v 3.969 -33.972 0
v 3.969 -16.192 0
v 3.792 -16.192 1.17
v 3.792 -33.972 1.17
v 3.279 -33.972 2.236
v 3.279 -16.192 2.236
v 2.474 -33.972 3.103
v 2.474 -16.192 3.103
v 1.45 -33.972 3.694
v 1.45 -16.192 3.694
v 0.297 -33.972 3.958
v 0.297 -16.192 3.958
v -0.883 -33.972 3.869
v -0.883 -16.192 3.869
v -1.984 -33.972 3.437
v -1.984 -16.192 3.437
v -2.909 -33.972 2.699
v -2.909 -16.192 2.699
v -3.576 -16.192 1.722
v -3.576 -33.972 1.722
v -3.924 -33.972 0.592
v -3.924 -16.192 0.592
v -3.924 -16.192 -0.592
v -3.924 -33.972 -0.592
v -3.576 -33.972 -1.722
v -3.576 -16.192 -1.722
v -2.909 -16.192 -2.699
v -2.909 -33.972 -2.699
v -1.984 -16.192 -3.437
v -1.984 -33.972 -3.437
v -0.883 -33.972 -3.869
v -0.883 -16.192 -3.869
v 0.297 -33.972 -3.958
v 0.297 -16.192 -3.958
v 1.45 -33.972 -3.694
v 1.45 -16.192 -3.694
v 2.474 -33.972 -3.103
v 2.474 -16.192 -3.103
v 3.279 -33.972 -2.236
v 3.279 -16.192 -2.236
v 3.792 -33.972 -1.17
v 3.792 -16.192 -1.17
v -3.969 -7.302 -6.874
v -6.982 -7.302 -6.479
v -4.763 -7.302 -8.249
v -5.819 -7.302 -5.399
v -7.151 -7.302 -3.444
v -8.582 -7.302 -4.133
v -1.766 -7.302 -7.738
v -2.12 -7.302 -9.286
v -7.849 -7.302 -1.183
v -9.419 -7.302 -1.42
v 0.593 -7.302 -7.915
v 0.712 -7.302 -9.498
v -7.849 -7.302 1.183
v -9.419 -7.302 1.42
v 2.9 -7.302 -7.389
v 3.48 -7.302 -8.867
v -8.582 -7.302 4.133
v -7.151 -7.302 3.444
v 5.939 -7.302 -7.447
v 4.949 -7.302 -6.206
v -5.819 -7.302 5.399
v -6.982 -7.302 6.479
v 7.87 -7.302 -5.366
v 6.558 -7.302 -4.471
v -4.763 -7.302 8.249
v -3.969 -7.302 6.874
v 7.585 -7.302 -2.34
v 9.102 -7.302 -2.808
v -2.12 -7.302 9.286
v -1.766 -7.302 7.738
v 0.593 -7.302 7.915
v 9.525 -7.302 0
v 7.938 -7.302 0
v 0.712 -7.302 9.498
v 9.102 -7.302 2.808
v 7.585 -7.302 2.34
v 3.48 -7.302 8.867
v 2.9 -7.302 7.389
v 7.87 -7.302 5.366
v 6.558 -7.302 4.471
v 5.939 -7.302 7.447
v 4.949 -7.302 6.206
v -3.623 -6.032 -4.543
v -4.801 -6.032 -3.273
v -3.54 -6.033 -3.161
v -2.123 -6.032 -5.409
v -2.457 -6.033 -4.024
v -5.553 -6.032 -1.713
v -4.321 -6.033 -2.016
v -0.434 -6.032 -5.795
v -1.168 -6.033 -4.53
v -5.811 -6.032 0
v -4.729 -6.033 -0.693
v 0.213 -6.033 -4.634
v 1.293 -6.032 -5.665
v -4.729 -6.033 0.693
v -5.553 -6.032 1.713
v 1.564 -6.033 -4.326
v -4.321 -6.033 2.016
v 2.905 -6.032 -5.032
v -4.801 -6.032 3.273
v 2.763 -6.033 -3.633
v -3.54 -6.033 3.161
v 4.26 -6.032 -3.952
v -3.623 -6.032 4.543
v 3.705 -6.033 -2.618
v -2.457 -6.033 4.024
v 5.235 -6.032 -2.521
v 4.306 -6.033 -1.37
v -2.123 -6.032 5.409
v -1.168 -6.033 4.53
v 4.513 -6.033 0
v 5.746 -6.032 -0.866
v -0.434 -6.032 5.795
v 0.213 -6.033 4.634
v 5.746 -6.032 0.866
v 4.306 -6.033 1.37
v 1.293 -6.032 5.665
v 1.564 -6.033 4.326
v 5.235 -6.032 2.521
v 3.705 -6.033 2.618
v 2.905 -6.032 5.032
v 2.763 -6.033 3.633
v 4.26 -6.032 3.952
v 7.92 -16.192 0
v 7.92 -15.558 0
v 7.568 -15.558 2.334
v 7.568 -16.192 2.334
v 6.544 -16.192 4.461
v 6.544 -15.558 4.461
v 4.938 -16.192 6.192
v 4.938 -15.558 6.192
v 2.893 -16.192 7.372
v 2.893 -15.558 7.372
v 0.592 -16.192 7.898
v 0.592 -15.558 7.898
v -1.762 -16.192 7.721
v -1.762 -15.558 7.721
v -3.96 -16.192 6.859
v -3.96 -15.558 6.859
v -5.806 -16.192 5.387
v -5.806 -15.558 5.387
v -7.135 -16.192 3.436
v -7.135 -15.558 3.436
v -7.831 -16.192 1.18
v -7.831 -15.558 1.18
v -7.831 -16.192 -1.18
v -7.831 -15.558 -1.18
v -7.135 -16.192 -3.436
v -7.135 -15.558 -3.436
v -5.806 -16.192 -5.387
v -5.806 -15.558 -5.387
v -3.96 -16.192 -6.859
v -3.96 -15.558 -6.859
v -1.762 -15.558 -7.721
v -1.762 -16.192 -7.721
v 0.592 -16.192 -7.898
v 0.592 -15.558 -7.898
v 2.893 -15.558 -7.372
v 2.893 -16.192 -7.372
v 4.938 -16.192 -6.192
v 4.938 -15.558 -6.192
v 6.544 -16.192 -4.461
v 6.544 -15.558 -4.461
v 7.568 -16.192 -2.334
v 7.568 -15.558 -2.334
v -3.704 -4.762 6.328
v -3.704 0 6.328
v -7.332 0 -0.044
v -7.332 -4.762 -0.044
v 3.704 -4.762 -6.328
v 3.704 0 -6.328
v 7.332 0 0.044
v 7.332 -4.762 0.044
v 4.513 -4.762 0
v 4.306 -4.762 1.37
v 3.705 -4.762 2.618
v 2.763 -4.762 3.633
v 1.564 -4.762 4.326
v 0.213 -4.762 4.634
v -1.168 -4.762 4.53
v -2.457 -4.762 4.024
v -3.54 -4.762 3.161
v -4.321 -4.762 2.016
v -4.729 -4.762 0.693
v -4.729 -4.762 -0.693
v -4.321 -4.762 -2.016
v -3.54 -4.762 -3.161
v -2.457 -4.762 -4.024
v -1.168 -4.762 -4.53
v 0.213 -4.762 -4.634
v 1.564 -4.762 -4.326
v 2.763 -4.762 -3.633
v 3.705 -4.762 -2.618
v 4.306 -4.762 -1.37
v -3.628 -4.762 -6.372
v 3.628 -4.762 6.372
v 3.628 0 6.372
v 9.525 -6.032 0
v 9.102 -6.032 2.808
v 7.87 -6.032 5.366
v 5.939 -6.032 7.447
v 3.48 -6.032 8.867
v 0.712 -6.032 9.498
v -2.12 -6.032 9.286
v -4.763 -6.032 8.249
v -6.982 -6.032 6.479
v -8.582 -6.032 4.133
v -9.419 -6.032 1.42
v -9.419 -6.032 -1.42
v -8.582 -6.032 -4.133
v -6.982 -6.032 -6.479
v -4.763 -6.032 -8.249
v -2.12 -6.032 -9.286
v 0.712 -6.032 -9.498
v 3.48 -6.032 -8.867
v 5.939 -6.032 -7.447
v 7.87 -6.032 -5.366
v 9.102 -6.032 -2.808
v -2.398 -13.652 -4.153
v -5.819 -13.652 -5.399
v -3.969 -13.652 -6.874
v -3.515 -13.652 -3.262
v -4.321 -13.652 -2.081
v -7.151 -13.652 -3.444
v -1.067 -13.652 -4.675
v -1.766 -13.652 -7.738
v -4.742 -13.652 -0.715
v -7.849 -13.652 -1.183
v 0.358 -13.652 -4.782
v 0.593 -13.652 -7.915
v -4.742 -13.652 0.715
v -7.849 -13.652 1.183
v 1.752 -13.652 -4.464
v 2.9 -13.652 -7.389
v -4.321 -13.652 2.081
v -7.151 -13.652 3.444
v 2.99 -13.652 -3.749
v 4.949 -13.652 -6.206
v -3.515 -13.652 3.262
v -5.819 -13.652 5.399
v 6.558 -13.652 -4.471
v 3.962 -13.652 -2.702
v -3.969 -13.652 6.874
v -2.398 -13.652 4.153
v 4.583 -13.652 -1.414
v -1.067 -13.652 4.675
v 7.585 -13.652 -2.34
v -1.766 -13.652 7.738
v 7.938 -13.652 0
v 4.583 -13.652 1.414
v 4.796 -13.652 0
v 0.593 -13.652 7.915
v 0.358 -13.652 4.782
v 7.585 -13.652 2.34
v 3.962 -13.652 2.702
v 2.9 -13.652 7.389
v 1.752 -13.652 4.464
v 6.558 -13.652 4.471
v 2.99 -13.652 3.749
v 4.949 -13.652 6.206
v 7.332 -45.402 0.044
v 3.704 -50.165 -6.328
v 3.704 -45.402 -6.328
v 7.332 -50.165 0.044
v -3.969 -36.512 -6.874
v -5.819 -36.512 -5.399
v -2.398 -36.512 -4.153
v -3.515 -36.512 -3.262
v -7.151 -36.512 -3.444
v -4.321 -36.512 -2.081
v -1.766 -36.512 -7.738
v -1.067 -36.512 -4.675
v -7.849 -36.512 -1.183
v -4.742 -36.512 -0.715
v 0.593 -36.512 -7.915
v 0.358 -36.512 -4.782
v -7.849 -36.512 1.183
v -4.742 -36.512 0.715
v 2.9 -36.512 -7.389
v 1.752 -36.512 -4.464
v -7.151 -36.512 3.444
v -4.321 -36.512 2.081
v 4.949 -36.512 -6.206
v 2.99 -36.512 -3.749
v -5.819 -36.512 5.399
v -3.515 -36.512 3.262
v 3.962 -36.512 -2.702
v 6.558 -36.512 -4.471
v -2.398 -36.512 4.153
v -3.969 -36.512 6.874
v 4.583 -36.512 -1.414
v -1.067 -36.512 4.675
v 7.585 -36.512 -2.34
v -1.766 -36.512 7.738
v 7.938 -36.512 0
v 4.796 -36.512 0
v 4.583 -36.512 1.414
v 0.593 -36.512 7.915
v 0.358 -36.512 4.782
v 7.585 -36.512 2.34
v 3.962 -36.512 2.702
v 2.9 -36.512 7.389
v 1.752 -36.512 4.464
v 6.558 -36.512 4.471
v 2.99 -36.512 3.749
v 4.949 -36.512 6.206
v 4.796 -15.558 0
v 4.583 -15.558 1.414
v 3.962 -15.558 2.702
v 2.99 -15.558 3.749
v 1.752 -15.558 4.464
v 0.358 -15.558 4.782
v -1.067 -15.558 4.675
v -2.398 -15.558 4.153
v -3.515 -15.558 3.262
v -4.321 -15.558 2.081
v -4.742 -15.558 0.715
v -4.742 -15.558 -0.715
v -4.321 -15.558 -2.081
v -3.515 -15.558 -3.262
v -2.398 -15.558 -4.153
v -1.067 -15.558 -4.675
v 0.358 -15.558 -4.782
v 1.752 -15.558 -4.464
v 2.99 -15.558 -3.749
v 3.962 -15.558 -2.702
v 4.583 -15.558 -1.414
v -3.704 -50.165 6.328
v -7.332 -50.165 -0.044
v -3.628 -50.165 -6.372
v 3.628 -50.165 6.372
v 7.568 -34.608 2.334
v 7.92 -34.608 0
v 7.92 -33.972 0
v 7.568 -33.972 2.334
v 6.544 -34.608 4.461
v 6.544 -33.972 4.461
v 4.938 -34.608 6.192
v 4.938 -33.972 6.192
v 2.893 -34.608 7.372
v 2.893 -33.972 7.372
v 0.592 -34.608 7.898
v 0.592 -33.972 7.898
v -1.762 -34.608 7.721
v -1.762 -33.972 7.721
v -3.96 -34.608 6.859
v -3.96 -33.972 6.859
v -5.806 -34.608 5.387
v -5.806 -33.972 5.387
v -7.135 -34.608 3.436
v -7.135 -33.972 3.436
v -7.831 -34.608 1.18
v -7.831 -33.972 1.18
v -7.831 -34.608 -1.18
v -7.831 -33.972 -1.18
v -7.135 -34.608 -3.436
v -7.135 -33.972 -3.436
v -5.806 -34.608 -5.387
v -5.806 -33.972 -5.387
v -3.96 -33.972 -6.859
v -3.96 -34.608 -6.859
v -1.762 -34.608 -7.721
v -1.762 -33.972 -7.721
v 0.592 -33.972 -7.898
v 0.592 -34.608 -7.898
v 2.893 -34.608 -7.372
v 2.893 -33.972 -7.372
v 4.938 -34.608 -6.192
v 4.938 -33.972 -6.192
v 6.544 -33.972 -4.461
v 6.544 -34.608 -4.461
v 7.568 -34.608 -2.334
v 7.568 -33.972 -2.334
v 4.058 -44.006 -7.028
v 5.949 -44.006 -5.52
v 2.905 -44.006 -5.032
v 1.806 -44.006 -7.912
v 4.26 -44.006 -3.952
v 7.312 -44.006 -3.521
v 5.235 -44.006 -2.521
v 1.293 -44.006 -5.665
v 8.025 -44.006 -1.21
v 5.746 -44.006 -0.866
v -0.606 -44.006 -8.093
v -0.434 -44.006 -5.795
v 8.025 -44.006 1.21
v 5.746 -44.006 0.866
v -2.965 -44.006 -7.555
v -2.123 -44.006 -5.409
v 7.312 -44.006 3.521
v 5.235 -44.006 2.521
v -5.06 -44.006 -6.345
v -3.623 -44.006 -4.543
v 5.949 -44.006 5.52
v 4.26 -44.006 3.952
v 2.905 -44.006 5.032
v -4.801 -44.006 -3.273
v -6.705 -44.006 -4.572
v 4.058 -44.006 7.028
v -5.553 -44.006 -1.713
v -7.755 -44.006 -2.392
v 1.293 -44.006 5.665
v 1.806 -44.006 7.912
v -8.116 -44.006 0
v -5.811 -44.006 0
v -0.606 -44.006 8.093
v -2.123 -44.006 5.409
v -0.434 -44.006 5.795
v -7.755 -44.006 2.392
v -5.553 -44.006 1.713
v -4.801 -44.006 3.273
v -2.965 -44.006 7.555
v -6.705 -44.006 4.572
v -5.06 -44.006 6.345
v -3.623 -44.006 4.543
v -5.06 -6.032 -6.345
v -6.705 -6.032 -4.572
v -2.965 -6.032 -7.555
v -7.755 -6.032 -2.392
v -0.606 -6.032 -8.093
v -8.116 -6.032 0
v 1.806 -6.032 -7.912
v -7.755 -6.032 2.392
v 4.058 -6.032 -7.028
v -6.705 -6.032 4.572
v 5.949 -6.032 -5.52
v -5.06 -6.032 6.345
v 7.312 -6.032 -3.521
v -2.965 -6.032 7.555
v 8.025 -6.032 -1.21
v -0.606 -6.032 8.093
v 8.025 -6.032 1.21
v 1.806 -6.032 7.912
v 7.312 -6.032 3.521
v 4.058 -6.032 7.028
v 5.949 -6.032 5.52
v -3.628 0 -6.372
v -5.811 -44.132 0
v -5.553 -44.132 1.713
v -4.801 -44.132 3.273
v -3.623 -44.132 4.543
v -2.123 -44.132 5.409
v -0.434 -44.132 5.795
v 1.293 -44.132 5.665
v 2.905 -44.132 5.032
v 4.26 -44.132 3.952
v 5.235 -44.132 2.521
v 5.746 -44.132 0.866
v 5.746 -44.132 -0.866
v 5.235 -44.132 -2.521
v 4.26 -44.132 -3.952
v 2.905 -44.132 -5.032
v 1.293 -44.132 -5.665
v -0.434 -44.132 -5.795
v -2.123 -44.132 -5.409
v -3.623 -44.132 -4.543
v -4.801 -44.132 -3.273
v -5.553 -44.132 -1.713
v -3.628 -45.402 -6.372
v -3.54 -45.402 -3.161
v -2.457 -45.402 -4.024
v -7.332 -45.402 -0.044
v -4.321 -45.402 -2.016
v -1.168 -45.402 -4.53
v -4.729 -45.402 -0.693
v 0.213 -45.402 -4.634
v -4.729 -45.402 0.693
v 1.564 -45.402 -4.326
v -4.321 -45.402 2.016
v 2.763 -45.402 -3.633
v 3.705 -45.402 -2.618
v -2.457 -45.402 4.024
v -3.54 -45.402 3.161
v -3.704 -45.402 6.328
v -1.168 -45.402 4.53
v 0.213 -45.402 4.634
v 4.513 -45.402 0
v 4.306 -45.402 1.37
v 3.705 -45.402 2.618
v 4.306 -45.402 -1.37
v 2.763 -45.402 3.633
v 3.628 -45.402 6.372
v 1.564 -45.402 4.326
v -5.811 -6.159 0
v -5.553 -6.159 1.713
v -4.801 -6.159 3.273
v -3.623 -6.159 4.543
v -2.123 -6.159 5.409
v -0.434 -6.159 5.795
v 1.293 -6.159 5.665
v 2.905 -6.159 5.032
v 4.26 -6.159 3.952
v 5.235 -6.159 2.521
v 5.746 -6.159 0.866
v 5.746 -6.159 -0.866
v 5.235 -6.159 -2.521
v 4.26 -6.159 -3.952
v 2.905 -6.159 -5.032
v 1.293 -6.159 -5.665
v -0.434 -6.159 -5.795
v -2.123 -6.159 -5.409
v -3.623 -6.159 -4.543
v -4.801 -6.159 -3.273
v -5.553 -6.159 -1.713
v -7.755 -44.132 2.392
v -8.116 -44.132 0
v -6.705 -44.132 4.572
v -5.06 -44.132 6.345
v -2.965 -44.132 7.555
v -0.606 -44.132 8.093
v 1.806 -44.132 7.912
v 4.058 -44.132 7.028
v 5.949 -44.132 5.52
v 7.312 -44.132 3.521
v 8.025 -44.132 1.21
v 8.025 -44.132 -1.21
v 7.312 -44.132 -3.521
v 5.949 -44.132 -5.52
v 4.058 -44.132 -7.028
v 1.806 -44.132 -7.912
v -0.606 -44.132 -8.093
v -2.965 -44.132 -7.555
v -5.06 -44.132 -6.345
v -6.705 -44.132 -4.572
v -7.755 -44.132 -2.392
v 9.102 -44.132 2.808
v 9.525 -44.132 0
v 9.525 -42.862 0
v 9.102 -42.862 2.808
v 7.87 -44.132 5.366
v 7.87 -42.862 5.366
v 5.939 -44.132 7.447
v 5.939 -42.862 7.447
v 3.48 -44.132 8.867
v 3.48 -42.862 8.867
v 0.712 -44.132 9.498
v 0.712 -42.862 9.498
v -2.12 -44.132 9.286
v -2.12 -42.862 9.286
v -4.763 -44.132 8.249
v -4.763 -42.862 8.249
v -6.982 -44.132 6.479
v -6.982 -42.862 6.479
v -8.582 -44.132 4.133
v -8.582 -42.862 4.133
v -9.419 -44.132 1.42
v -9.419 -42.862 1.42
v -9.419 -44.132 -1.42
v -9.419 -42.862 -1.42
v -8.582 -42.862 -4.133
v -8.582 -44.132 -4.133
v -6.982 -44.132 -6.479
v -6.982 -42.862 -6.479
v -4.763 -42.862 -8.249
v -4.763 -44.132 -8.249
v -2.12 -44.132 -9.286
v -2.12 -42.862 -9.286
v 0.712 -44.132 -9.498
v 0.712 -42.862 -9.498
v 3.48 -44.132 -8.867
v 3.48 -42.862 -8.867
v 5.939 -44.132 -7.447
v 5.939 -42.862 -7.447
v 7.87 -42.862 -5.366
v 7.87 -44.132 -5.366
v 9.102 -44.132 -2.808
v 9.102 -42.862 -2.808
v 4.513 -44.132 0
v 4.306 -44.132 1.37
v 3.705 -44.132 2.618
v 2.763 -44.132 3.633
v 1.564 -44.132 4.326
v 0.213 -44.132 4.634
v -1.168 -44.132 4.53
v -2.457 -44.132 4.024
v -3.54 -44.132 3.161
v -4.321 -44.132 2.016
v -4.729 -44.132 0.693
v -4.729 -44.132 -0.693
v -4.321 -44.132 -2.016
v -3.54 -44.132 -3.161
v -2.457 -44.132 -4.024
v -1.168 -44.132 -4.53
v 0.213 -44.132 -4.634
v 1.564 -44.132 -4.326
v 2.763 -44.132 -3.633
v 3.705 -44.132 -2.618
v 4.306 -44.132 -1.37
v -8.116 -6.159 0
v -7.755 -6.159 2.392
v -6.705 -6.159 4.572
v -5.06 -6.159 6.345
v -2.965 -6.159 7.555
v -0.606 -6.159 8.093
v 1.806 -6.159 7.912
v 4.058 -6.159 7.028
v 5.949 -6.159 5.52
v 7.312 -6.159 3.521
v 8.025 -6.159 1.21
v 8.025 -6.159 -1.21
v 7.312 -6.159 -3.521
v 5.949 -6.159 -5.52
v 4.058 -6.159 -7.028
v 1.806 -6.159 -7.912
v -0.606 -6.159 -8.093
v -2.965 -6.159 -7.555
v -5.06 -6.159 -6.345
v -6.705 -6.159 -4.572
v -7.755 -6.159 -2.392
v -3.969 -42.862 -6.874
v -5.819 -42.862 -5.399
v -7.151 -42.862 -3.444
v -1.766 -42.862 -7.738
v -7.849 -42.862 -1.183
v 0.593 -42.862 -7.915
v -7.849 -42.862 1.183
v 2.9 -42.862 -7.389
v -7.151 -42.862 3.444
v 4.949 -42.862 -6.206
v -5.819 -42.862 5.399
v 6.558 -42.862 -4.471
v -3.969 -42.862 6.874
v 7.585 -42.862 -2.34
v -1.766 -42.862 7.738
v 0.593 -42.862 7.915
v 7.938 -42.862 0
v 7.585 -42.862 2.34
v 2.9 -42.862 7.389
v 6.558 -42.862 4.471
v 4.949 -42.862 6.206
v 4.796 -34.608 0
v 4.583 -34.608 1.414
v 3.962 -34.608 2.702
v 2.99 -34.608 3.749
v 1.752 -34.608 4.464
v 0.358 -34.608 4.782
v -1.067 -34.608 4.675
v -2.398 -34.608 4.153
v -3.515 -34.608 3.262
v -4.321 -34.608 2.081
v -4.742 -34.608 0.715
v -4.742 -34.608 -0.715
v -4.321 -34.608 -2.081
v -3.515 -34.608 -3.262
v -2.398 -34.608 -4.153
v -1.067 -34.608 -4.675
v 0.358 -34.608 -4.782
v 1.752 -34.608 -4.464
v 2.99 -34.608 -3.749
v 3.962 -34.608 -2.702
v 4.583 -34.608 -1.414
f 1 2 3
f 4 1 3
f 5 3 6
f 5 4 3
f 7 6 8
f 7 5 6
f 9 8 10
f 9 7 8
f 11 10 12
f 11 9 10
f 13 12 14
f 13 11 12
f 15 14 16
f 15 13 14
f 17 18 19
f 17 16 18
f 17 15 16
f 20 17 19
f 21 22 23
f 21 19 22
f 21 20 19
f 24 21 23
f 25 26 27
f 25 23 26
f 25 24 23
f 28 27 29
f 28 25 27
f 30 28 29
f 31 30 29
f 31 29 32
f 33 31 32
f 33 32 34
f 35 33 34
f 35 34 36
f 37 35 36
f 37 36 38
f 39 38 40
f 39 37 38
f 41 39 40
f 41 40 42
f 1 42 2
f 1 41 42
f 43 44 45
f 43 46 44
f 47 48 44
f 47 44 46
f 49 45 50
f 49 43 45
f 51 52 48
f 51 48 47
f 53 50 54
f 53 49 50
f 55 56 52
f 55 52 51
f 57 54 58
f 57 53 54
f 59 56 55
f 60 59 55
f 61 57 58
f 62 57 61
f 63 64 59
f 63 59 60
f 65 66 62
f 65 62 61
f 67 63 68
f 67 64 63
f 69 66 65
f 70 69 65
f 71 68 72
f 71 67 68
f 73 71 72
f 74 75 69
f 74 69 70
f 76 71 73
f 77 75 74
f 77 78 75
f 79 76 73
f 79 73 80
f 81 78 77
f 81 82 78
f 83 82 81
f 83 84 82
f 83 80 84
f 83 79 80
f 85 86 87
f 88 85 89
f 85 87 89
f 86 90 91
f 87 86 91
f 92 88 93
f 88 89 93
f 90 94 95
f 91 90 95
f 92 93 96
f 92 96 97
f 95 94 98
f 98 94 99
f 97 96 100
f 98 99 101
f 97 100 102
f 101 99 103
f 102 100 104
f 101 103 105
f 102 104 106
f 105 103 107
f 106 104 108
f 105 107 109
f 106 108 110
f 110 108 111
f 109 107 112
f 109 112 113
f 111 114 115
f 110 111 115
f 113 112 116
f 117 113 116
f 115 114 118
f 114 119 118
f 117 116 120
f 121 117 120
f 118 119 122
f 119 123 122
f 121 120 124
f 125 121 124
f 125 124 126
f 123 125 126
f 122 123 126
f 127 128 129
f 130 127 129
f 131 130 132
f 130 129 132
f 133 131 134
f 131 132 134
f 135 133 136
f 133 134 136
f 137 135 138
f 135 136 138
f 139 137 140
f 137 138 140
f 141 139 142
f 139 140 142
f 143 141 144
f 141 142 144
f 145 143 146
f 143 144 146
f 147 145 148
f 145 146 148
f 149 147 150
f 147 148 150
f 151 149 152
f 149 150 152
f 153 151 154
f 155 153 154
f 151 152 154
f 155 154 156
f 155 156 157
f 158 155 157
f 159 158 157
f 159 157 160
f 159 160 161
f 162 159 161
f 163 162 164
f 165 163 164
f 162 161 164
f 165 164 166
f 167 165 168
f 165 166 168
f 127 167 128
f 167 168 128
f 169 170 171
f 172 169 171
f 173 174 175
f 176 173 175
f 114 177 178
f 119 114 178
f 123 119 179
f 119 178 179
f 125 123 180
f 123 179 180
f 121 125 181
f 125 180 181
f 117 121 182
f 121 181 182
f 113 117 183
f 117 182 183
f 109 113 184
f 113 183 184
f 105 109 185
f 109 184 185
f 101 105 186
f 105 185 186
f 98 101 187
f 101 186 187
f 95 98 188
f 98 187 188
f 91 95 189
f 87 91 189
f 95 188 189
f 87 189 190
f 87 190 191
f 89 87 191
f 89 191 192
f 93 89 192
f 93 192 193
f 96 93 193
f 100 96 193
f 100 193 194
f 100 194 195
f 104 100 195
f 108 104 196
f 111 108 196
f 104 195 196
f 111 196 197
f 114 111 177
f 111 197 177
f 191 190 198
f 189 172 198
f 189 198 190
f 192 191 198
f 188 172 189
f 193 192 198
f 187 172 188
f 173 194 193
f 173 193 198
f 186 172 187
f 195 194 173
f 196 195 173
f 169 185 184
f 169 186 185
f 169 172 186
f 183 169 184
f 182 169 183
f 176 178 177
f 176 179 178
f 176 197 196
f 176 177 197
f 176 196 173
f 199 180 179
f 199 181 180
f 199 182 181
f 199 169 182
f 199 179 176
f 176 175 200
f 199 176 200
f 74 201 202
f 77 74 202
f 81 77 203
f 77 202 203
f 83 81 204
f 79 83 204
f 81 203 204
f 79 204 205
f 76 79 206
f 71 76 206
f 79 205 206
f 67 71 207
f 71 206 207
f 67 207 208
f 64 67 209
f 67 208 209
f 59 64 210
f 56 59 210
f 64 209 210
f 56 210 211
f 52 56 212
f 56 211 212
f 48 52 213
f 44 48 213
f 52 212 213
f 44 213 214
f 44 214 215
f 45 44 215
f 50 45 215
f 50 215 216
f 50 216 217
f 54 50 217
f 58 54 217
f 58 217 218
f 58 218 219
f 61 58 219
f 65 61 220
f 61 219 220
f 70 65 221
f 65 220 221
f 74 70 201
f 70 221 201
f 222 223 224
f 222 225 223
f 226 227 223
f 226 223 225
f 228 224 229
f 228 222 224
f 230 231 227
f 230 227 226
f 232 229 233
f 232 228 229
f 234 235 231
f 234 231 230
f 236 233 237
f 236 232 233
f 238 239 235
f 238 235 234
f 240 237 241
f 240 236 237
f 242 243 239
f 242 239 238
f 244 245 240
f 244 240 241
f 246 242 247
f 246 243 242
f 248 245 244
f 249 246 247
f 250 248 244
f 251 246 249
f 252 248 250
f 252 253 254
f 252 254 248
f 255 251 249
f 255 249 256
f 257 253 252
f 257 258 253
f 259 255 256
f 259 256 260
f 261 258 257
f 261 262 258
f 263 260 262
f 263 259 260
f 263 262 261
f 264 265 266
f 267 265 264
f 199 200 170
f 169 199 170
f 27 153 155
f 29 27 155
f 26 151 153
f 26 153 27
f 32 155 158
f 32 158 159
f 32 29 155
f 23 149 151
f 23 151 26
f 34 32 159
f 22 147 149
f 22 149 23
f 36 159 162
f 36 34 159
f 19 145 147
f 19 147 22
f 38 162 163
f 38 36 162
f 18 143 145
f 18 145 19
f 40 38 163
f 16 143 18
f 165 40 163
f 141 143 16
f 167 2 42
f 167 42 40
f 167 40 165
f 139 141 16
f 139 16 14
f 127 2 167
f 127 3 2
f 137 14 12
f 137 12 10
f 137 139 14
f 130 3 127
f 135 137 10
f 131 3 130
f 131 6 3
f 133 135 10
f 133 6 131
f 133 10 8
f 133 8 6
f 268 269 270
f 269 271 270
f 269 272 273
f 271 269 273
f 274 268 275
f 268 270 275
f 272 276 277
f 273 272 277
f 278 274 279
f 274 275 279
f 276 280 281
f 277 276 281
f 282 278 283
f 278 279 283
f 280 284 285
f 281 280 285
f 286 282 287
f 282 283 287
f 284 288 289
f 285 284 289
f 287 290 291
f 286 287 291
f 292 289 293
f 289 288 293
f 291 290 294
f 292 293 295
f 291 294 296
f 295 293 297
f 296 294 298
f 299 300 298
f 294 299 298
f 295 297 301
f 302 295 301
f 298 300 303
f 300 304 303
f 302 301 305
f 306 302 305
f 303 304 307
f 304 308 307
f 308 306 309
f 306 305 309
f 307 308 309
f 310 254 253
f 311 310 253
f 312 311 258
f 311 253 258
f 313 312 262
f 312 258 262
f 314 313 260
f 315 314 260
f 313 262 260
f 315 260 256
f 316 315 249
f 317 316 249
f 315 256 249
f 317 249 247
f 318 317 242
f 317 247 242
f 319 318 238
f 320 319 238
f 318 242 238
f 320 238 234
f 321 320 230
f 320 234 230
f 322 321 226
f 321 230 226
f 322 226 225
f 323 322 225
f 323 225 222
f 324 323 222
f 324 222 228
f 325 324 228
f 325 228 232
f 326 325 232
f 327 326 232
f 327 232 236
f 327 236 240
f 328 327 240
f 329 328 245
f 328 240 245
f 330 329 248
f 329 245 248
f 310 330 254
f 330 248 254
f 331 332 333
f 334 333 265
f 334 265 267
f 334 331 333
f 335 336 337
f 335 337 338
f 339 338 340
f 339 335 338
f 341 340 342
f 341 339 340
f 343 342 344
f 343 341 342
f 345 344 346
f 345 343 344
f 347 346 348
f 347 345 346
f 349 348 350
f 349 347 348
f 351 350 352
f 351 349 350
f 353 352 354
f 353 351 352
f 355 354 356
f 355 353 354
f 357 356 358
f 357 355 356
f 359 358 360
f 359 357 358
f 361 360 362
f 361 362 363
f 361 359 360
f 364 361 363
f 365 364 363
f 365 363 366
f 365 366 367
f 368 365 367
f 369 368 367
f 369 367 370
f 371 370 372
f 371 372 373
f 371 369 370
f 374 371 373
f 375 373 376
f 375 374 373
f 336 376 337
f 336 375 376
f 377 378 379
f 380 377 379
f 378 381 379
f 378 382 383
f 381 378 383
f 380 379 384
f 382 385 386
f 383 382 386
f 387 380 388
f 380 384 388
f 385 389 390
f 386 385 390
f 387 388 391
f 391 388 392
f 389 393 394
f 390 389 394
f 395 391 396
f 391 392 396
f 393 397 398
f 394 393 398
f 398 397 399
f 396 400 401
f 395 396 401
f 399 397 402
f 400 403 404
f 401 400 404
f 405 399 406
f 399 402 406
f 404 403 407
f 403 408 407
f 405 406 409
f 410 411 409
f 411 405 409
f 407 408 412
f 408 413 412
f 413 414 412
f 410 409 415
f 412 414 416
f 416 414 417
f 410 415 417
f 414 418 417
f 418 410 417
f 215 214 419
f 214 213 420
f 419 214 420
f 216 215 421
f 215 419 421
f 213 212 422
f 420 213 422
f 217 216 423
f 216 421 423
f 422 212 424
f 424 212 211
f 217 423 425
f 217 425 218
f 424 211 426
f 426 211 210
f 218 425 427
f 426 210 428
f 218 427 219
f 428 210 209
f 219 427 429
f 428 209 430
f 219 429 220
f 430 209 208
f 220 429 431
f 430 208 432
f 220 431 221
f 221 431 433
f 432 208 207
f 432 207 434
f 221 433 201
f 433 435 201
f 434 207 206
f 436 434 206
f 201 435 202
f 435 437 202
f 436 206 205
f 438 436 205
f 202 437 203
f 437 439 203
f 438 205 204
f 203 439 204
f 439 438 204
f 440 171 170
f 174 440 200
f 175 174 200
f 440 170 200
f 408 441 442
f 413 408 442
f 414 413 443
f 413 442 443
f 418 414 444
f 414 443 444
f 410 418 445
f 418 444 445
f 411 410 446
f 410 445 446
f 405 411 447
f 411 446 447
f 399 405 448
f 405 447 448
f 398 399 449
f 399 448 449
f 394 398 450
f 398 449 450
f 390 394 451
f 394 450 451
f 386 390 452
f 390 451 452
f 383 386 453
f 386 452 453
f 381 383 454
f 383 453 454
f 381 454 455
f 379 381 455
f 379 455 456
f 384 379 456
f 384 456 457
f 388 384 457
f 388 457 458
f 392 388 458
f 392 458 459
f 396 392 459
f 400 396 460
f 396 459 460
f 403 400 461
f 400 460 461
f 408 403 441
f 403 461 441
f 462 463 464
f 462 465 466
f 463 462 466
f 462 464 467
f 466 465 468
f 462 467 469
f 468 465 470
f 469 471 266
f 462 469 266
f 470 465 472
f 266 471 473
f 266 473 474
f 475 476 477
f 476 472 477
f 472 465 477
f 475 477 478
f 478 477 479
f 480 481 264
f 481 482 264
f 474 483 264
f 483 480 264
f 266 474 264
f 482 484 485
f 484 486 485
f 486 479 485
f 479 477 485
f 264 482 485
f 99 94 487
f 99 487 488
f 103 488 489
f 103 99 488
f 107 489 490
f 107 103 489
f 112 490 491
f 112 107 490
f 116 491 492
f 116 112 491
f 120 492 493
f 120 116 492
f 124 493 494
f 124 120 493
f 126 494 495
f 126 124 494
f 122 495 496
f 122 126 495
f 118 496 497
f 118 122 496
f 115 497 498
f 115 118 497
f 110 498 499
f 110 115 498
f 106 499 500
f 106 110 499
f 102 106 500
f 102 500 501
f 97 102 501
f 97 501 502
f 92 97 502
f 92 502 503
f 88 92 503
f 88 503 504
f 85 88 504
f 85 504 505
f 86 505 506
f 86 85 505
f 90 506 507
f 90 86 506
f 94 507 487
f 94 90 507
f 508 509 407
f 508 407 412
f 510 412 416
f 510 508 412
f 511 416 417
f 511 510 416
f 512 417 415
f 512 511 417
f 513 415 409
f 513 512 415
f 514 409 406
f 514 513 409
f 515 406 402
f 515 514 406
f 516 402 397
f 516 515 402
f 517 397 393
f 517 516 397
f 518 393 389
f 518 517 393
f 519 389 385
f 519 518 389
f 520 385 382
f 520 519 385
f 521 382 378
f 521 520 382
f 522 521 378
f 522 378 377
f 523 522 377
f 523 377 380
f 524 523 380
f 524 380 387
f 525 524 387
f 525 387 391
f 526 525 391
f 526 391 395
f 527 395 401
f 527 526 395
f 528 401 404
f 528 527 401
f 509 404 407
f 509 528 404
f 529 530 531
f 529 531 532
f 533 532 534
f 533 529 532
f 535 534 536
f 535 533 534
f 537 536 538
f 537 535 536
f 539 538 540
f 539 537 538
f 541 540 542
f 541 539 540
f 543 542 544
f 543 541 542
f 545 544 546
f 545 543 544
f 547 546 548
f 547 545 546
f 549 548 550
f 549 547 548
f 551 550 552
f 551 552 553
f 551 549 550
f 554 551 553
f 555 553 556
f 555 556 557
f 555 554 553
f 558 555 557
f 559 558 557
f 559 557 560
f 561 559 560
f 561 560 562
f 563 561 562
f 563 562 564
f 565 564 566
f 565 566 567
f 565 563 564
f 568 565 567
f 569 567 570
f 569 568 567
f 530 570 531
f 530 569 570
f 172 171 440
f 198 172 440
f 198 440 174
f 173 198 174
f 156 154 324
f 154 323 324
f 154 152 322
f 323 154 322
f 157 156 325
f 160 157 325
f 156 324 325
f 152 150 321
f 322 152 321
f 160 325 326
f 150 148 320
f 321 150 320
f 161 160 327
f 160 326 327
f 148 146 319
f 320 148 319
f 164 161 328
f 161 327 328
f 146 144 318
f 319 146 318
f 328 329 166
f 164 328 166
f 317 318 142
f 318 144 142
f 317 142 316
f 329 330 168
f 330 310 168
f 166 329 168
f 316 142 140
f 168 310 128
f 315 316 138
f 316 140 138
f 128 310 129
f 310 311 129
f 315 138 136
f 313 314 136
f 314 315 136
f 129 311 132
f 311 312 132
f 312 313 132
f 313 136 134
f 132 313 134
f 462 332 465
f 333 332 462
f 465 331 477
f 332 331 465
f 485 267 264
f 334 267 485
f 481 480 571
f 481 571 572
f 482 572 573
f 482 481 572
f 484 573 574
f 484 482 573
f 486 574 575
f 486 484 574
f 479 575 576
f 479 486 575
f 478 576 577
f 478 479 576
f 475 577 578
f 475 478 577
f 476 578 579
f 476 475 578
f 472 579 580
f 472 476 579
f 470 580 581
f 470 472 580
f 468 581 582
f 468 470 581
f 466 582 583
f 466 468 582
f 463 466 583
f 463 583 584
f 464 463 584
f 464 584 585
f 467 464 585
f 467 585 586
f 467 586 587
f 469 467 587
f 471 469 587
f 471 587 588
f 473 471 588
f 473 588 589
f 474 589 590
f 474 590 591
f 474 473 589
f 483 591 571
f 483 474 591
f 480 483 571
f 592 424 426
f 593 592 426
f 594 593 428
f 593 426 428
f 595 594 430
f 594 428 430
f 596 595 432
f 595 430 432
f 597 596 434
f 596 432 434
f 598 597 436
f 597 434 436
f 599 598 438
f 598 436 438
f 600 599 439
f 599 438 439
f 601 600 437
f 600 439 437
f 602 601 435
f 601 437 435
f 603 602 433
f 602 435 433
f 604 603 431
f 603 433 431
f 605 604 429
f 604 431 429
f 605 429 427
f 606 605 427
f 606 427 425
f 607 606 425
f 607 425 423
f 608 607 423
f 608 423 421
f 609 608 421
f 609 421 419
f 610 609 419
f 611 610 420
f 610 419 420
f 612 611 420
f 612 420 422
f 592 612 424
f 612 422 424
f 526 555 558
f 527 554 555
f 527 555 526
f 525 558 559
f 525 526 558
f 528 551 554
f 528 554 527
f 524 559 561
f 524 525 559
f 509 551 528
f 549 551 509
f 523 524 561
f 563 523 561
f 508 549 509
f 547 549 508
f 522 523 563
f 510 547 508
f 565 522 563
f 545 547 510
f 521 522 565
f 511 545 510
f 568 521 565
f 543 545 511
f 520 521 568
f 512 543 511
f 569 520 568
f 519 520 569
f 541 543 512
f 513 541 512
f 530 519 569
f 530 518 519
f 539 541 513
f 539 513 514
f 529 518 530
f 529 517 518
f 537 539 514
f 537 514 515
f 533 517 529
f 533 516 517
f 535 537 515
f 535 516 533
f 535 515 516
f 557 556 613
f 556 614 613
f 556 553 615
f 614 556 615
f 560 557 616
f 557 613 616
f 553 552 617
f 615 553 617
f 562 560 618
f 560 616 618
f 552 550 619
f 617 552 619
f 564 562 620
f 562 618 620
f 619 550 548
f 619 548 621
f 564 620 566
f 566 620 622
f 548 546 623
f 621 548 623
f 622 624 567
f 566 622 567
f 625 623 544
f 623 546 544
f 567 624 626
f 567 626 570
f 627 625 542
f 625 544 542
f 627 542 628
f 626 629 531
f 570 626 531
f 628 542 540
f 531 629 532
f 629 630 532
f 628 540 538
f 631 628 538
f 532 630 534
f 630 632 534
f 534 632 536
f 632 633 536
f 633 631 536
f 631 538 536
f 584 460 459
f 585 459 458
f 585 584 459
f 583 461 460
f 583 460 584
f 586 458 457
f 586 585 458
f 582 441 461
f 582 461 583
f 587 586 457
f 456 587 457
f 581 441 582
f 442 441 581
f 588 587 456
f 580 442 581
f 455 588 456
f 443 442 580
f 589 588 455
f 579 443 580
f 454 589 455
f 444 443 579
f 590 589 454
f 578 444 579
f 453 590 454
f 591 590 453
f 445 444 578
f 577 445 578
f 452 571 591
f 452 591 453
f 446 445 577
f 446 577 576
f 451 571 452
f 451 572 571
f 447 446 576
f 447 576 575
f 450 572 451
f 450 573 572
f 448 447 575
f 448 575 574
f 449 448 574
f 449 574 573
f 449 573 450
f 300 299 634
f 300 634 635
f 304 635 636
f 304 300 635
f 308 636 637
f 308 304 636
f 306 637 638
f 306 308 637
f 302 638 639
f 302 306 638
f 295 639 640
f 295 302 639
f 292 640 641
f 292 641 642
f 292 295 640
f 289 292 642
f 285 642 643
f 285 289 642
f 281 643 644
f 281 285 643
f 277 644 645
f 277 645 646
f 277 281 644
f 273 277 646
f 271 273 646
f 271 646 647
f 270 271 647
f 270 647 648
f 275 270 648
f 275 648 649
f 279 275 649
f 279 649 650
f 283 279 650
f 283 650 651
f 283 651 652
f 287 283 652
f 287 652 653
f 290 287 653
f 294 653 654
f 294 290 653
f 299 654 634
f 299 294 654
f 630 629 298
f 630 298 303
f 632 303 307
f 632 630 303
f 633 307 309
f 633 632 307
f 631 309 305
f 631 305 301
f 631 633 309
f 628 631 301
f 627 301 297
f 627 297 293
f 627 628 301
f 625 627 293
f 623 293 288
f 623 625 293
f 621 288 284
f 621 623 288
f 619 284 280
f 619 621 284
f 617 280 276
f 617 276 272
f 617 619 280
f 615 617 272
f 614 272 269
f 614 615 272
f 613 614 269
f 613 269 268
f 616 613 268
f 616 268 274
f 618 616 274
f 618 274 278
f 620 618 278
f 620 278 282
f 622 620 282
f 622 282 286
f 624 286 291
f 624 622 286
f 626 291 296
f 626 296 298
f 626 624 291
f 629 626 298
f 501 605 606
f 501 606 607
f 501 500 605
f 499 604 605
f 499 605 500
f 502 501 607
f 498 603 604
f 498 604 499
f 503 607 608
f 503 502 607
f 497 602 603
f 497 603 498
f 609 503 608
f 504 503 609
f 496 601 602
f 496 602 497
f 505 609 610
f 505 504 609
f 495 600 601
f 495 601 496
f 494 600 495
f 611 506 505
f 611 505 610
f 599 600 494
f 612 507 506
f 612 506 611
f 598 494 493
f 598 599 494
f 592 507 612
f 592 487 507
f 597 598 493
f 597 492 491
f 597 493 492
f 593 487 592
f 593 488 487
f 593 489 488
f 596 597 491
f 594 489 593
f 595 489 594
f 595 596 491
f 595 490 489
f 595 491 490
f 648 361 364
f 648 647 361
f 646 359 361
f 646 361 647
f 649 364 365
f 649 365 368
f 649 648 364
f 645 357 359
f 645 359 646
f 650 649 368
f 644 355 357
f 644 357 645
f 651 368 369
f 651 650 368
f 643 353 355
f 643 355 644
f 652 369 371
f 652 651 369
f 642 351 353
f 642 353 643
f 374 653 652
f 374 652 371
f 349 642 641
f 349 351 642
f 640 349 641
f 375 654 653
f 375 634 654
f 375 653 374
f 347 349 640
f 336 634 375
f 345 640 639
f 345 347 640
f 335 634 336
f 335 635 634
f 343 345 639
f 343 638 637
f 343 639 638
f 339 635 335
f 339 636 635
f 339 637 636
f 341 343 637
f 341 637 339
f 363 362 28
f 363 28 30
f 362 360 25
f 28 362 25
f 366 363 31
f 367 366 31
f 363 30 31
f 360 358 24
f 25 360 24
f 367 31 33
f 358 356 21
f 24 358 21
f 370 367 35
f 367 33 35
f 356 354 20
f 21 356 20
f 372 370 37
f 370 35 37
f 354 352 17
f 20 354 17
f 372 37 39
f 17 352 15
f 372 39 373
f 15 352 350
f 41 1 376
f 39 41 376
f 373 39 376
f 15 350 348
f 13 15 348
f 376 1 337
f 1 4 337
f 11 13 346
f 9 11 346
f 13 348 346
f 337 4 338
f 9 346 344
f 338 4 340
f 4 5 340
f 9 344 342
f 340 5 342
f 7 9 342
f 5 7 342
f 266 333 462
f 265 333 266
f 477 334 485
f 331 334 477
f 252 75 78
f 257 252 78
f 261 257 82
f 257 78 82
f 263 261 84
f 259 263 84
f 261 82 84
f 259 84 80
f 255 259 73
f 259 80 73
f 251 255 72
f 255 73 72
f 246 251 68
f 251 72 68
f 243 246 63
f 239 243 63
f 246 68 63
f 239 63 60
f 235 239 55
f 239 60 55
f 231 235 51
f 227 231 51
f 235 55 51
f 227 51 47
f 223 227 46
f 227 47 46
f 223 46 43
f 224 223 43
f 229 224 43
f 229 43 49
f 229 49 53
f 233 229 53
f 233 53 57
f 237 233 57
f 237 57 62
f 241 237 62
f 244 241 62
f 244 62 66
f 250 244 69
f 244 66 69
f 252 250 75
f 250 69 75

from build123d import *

# Parameters (mm, degrees)
F1_DEPTH  = 4.7625
F2_R      = 3.96875
F3_DEPTH  = 20.32
F4_R      = 4.646824
F5_DEPTH  = 1.27
F6_R      = 9.525
F7_DEPTH  = 1.27
F8_R      = 8.115577
F8_R_2    = 5.810874
F9_DEPTH  = 0.127
F10_R     = 7.9375
F11_DEPTH = 6.35
F12_R     = 4.795683
F13_DEPTH = 1.905
F14_R     = 7.919715
F15_DEPTH = 0.635


with BuildPart() as f1:
    # F0 (on Front) → F1 (new body)
    with BuildSketch(Plane.XZ):
        Polygon((-3.70389, 6.328075), (-7.332219, -0.043625), (-3.628329, -6.3717), (3.70389, -6.328075), (7.332219, 0.043625), (3.628329, 6.3717), align=None)
    extrude(amount=F1_DEPTH)

    # F2 (on face) → F3 (join)
    with BuildSketch(Plane.XZ.offset(4.7625)):
        Circle(F2_R)
    extrude(amount=F3_DEPTH)

    # F4 (on face) → F5 (join)
    with BuildSketch(Plane.XZ.offset(4.7625)):
        with Locations((-0.133895, 0)):
            Circle(F4_R)
    extrude(amount=F5_DEPTH)

    # F6 (on face) → F7 (join)
    with BuildSketch(Plane.XZ.offset(6.0325)):
        Circle(F6_R)
    extrude(amount=F7_DEPTH)

    # F8 (on face) → F9 (cut)
    with BuildSketch(Plane(origin=(0, -6.0325, 0), x_dir=(-1, 0, 0), z_dir=(0, 1, 0))):
        Circle(F8_R)
        Circle(F8_R_2, mode=Mode.SUBTRACT)
    extrude(amount=-F9_DEPTH, mode=Mode.SUBTRACT)

    # F10 (on face) → F11 (join)
    with BuildSketch(Plane.XZ.offset(7.3025)):
        Circle(F10_R)
    extrude(amount=F11_DEPTH)

    # F12 (on face) → F13 (join)
    with BuildSketch(Plane.XZ.offset(13.6525)):
        Circle(F12_R)
    extrude(amount=F13_DEPTH)

    # F14 (on face) → F15 (join)
    with BuildSketch(Plane.XZ.offset(15.5575)):
        Circle(F14_R)
    extrude(amount=F15_DEPTH)

    # F16: F1 across face


with BuildPart() as f1_1:
    add(f1.part)
    add(f1.part.mirror(Plane.XZ.offset(25.0825)))


solid = f1_1.part
